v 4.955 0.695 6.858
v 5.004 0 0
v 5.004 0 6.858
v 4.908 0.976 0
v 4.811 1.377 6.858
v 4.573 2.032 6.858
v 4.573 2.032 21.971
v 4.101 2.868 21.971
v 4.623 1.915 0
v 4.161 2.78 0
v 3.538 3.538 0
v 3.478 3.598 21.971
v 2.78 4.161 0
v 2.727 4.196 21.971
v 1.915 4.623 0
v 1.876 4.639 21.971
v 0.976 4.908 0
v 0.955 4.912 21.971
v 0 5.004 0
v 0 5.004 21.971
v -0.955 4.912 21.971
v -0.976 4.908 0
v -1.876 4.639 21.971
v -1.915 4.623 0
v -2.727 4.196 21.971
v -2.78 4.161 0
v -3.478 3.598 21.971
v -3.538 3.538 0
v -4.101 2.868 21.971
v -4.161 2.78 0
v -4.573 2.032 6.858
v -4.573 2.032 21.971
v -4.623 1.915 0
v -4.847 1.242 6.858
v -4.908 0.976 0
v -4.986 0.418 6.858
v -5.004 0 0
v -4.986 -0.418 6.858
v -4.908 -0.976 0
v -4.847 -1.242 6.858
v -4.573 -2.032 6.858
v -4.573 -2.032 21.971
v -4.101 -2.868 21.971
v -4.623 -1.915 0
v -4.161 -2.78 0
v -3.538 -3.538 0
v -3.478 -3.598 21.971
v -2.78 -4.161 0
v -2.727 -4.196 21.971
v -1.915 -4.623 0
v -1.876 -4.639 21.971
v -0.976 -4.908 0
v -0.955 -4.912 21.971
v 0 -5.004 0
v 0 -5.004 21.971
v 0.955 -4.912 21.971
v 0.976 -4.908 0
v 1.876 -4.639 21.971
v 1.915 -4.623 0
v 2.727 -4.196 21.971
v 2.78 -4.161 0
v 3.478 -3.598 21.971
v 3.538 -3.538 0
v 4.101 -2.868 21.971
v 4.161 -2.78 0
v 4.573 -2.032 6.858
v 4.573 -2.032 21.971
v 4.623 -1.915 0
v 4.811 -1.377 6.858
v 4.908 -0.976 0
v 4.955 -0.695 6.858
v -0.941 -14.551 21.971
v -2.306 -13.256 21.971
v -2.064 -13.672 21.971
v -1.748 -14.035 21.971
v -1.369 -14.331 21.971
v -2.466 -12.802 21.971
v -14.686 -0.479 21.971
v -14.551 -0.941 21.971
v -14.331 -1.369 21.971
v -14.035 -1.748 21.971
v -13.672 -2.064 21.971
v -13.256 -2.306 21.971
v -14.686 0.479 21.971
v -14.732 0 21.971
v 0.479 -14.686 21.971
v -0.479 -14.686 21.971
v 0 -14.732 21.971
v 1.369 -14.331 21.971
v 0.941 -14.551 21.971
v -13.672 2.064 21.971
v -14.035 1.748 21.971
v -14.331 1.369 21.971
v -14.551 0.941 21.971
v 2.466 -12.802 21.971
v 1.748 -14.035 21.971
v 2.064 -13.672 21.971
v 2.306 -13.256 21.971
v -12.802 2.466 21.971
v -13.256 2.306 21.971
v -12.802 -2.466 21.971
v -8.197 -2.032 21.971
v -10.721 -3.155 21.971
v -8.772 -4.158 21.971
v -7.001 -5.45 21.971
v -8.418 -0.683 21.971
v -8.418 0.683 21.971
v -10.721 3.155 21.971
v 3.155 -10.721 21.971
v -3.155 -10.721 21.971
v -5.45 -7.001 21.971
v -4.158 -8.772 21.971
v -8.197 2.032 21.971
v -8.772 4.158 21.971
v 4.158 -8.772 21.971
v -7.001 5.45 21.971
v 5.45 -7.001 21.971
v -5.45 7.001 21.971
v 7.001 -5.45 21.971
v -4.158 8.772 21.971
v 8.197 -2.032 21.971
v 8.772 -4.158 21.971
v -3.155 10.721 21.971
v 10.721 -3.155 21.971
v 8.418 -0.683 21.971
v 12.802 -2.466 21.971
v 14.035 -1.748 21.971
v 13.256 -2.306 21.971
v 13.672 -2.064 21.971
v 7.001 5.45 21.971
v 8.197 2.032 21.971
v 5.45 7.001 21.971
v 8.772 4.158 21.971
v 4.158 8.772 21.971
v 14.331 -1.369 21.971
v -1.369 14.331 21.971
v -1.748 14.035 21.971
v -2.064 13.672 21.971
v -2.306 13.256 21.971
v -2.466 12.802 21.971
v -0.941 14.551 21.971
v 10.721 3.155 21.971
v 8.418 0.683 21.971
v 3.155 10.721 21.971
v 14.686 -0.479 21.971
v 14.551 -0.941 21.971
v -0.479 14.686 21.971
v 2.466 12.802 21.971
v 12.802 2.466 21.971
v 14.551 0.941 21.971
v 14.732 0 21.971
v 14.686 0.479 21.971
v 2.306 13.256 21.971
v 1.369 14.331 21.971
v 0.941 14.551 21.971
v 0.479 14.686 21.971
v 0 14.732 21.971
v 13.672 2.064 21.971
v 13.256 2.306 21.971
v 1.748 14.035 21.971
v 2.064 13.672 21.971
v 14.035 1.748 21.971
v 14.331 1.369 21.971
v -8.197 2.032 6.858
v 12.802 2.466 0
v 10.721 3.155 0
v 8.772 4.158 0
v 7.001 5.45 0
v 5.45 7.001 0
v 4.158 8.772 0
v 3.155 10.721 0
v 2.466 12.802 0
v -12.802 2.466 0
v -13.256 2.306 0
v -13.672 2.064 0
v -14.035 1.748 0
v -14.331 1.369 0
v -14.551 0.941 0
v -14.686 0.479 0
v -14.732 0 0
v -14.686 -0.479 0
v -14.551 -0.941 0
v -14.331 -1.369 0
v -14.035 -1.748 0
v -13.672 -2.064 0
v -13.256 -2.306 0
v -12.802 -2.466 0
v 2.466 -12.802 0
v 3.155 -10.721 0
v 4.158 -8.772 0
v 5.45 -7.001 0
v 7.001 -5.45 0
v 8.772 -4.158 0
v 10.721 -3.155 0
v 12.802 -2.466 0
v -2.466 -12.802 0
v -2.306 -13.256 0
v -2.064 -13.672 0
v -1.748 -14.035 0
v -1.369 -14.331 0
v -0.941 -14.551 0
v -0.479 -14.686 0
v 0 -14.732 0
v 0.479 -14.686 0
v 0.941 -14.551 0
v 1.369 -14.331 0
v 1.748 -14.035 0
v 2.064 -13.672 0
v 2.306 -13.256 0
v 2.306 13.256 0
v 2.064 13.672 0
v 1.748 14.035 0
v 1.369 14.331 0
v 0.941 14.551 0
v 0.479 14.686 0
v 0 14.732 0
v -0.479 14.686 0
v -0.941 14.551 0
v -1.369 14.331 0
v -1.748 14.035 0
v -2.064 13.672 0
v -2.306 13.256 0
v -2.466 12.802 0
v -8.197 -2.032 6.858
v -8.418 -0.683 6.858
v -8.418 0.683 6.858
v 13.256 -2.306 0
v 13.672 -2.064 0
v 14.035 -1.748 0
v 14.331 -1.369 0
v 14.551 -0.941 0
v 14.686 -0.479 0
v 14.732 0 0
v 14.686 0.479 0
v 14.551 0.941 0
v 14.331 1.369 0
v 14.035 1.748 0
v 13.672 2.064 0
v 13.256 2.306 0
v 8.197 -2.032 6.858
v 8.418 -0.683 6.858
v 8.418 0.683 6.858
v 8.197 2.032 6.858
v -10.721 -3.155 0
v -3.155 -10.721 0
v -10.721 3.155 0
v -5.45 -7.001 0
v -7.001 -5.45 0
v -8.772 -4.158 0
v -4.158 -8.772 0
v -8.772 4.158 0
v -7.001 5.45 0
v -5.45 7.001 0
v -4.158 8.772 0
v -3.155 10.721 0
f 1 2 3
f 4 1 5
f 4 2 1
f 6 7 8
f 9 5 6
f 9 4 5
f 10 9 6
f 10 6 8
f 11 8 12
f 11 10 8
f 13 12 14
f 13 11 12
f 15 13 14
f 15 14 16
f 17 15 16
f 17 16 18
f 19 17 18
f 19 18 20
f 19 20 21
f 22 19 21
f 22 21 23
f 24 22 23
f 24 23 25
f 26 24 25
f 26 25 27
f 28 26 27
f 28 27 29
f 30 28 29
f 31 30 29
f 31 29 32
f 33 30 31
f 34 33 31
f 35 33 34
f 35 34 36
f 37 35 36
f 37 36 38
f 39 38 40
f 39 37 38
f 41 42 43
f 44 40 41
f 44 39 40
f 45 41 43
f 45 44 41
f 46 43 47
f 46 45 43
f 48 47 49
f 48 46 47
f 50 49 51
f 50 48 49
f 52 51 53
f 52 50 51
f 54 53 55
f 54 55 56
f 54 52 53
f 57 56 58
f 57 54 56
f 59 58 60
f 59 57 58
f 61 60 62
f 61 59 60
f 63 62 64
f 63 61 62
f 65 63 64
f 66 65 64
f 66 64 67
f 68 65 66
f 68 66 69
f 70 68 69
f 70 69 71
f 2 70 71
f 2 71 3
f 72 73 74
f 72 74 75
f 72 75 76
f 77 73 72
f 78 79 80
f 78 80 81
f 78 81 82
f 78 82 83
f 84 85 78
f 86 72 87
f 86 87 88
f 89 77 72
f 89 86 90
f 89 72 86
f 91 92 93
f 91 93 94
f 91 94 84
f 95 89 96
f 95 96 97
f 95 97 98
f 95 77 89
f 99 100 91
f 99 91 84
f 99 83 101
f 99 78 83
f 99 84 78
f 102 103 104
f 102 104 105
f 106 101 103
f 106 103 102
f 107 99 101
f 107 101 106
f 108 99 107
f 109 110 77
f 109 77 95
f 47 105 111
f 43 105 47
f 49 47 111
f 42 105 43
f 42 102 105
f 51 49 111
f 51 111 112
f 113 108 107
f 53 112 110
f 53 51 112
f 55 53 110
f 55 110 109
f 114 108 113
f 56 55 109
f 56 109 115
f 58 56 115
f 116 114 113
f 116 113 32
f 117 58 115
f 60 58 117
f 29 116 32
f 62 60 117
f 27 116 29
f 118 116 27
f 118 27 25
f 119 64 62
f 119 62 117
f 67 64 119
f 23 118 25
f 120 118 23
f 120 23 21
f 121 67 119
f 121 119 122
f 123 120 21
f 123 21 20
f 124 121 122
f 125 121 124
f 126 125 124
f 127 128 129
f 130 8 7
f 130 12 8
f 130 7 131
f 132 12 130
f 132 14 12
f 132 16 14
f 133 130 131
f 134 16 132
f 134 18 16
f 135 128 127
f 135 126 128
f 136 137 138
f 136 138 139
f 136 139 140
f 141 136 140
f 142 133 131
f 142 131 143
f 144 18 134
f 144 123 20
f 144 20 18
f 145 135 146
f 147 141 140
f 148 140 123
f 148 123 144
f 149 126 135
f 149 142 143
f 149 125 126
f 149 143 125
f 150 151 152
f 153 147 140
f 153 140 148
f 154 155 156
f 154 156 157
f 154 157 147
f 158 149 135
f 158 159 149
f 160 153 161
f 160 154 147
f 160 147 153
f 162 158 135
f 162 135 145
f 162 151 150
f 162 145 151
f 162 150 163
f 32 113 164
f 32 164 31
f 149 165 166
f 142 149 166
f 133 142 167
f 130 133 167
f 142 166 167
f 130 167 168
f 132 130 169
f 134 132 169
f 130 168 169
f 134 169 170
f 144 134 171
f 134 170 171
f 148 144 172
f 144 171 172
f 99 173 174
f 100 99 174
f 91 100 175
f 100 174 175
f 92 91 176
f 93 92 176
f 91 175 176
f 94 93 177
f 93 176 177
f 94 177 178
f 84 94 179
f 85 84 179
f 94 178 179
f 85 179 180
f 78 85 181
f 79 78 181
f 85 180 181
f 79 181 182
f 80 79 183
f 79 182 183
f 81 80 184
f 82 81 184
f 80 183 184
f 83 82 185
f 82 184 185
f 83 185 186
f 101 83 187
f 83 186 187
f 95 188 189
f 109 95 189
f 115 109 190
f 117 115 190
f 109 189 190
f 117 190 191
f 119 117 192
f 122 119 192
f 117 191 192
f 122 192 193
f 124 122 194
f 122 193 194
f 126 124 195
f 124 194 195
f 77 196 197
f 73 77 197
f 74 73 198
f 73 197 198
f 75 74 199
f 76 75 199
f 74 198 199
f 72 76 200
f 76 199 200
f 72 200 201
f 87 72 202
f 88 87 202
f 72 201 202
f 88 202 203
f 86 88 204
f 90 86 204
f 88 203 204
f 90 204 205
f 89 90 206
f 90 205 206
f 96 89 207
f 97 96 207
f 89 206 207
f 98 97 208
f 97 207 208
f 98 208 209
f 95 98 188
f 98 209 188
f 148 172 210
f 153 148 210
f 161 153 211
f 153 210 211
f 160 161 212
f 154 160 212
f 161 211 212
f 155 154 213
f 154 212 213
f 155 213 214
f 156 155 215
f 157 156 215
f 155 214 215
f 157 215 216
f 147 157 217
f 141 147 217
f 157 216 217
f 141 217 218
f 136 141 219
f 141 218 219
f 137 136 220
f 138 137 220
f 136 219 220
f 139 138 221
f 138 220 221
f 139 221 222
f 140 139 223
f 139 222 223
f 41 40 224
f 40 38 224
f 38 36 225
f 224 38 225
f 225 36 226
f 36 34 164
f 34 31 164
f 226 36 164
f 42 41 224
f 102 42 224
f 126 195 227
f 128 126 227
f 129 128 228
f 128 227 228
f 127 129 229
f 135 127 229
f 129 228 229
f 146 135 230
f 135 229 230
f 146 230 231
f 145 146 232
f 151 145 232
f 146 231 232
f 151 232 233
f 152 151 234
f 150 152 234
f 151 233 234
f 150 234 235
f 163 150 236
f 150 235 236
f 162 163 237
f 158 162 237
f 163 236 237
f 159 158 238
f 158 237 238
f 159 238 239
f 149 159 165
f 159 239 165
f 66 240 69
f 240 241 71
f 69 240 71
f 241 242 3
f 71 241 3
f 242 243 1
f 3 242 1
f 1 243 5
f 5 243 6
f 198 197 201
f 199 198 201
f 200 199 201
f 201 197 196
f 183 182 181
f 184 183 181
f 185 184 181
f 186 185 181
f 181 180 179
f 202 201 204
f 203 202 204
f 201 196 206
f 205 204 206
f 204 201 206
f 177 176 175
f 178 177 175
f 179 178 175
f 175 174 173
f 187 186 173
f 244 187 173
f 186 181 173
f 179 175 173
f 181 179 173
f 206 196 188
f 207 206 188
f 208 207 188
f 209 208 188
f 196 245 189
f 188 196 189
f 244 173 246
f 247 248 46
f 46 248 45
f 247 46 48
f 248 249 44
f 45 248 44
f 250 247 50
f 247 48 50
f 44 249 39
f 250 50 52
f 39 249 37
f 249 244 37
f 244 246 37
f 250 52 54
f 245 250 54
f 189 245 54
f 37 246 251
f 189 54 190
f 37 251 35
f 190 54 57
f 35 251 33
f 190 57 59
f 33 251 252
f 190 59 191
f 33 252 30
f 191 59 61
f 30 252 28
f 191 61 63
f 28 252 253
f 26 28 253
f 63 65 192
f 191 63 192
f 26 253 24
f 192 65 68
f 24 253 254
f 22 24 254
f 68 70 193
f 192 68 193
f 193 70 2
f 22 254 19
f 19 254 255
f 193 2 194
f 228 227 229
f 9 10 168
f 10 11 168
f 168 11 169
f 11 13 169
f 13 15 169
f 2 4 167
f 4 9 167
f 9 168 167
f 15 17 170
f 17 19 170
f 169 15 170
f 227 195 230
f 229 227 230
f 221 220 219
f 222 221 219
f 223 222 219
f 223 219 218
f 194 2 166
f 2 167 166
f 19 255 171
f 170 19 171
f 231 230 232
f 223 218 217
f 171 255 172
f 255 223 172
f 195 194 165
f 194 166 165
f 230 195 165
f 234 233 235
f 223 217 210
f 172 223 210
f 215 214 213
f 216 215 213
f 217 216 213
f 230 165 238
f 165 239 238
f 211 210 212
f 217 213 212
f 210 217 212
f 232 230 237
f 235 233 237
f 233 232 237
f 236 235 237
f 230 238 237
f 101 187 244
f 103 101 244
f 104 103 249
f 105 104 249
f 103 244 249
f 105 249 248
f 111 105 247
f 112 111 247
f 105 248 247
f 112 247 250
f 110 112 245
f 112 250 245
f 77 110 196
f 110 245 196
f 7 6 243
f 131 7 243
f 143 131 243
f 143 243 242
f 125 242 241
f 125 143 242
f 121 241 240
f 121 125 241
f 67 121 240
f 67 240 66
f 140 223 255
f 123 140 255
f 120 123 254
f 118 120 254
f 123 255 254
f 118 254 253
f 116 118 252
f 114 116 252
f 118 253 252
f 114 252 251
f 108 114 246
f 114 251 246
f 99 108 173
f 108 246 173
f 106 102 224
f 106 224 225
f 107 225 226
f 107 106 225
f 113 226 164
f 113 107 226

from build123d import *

# Parameters (mm, degrees)
SKETCH1_R          = 5.0038
BASE_EXTRUDE_DEPTH = 21.971
CUT_EXTRUDE1_DEPTH = 15.113


with BuildPart() as part:
    # Sketch1 → Base-Extrude (new body)
    with BuildSketch(Plane.XY):
        with BuildLine():
            ThreePointArc((2.465672848, 12.801965086), (0, 14.732), (-2.465672848, 12.801965086))
            ThreePointArc((-2.465672848, 12.801965086), (-6.195465294, 6.195465294), (-12.801965086, 2.465672848))
            ThreePointArc((-12.801965086, 2.465672848), (-14.732, 0), (-12.801965086, -2.465672848))
            ThreePointArc((-12.801965086, -2.465672848), (-6.195465294, -6.195465294), (-2.465672848, -12.801965086))
            ThreePointArc((-2.465672848, -12.801965086), (0, -14.732), (2.465672848, -12.801965086))
            ThreePointArc((2.465672848, -12.801965086), (6.195465294, -6.195465294), (12.801965086, -2.465672848))
            ThreePointArc((12.801965086, -2.465672848), (14.732, 0), (12.801965086, 2.465672848))
            ThreePointArc((12.801965086, 2.465672848), (6.195465294, 6.195465294), (2.465672848, 12.801965086))
        make_face()
        Circle(SKETCH1_R, mode=Mode.SUBTRACT)
    extrude(amount=BASE_EXTRUDE_DEPTH)

    # Sketch2 → Cut-Extrude1 (cut)
    with BuildSketch(Plane.XY.offset(21.971)):
        with BuildLine():
            Line((-8.197404848, 2.032), (8.197404848, 2.032))
            ThreePointArc((8.197404848, 2.032), (8.4455, 0), (8.197404848, -2.032))
            Line((8.197404848, -2.032), (-8.197404848, -2.032))
            ThreePointArc((-8.197404848, -2.032), (-8.4455, 0), (-8.197404848, 2.032))
        make_face()
    extrude(amount=-CUT_EXTRUDE1_DEPTH, mode=Mode.SUBTRACT)


solid = part.part
